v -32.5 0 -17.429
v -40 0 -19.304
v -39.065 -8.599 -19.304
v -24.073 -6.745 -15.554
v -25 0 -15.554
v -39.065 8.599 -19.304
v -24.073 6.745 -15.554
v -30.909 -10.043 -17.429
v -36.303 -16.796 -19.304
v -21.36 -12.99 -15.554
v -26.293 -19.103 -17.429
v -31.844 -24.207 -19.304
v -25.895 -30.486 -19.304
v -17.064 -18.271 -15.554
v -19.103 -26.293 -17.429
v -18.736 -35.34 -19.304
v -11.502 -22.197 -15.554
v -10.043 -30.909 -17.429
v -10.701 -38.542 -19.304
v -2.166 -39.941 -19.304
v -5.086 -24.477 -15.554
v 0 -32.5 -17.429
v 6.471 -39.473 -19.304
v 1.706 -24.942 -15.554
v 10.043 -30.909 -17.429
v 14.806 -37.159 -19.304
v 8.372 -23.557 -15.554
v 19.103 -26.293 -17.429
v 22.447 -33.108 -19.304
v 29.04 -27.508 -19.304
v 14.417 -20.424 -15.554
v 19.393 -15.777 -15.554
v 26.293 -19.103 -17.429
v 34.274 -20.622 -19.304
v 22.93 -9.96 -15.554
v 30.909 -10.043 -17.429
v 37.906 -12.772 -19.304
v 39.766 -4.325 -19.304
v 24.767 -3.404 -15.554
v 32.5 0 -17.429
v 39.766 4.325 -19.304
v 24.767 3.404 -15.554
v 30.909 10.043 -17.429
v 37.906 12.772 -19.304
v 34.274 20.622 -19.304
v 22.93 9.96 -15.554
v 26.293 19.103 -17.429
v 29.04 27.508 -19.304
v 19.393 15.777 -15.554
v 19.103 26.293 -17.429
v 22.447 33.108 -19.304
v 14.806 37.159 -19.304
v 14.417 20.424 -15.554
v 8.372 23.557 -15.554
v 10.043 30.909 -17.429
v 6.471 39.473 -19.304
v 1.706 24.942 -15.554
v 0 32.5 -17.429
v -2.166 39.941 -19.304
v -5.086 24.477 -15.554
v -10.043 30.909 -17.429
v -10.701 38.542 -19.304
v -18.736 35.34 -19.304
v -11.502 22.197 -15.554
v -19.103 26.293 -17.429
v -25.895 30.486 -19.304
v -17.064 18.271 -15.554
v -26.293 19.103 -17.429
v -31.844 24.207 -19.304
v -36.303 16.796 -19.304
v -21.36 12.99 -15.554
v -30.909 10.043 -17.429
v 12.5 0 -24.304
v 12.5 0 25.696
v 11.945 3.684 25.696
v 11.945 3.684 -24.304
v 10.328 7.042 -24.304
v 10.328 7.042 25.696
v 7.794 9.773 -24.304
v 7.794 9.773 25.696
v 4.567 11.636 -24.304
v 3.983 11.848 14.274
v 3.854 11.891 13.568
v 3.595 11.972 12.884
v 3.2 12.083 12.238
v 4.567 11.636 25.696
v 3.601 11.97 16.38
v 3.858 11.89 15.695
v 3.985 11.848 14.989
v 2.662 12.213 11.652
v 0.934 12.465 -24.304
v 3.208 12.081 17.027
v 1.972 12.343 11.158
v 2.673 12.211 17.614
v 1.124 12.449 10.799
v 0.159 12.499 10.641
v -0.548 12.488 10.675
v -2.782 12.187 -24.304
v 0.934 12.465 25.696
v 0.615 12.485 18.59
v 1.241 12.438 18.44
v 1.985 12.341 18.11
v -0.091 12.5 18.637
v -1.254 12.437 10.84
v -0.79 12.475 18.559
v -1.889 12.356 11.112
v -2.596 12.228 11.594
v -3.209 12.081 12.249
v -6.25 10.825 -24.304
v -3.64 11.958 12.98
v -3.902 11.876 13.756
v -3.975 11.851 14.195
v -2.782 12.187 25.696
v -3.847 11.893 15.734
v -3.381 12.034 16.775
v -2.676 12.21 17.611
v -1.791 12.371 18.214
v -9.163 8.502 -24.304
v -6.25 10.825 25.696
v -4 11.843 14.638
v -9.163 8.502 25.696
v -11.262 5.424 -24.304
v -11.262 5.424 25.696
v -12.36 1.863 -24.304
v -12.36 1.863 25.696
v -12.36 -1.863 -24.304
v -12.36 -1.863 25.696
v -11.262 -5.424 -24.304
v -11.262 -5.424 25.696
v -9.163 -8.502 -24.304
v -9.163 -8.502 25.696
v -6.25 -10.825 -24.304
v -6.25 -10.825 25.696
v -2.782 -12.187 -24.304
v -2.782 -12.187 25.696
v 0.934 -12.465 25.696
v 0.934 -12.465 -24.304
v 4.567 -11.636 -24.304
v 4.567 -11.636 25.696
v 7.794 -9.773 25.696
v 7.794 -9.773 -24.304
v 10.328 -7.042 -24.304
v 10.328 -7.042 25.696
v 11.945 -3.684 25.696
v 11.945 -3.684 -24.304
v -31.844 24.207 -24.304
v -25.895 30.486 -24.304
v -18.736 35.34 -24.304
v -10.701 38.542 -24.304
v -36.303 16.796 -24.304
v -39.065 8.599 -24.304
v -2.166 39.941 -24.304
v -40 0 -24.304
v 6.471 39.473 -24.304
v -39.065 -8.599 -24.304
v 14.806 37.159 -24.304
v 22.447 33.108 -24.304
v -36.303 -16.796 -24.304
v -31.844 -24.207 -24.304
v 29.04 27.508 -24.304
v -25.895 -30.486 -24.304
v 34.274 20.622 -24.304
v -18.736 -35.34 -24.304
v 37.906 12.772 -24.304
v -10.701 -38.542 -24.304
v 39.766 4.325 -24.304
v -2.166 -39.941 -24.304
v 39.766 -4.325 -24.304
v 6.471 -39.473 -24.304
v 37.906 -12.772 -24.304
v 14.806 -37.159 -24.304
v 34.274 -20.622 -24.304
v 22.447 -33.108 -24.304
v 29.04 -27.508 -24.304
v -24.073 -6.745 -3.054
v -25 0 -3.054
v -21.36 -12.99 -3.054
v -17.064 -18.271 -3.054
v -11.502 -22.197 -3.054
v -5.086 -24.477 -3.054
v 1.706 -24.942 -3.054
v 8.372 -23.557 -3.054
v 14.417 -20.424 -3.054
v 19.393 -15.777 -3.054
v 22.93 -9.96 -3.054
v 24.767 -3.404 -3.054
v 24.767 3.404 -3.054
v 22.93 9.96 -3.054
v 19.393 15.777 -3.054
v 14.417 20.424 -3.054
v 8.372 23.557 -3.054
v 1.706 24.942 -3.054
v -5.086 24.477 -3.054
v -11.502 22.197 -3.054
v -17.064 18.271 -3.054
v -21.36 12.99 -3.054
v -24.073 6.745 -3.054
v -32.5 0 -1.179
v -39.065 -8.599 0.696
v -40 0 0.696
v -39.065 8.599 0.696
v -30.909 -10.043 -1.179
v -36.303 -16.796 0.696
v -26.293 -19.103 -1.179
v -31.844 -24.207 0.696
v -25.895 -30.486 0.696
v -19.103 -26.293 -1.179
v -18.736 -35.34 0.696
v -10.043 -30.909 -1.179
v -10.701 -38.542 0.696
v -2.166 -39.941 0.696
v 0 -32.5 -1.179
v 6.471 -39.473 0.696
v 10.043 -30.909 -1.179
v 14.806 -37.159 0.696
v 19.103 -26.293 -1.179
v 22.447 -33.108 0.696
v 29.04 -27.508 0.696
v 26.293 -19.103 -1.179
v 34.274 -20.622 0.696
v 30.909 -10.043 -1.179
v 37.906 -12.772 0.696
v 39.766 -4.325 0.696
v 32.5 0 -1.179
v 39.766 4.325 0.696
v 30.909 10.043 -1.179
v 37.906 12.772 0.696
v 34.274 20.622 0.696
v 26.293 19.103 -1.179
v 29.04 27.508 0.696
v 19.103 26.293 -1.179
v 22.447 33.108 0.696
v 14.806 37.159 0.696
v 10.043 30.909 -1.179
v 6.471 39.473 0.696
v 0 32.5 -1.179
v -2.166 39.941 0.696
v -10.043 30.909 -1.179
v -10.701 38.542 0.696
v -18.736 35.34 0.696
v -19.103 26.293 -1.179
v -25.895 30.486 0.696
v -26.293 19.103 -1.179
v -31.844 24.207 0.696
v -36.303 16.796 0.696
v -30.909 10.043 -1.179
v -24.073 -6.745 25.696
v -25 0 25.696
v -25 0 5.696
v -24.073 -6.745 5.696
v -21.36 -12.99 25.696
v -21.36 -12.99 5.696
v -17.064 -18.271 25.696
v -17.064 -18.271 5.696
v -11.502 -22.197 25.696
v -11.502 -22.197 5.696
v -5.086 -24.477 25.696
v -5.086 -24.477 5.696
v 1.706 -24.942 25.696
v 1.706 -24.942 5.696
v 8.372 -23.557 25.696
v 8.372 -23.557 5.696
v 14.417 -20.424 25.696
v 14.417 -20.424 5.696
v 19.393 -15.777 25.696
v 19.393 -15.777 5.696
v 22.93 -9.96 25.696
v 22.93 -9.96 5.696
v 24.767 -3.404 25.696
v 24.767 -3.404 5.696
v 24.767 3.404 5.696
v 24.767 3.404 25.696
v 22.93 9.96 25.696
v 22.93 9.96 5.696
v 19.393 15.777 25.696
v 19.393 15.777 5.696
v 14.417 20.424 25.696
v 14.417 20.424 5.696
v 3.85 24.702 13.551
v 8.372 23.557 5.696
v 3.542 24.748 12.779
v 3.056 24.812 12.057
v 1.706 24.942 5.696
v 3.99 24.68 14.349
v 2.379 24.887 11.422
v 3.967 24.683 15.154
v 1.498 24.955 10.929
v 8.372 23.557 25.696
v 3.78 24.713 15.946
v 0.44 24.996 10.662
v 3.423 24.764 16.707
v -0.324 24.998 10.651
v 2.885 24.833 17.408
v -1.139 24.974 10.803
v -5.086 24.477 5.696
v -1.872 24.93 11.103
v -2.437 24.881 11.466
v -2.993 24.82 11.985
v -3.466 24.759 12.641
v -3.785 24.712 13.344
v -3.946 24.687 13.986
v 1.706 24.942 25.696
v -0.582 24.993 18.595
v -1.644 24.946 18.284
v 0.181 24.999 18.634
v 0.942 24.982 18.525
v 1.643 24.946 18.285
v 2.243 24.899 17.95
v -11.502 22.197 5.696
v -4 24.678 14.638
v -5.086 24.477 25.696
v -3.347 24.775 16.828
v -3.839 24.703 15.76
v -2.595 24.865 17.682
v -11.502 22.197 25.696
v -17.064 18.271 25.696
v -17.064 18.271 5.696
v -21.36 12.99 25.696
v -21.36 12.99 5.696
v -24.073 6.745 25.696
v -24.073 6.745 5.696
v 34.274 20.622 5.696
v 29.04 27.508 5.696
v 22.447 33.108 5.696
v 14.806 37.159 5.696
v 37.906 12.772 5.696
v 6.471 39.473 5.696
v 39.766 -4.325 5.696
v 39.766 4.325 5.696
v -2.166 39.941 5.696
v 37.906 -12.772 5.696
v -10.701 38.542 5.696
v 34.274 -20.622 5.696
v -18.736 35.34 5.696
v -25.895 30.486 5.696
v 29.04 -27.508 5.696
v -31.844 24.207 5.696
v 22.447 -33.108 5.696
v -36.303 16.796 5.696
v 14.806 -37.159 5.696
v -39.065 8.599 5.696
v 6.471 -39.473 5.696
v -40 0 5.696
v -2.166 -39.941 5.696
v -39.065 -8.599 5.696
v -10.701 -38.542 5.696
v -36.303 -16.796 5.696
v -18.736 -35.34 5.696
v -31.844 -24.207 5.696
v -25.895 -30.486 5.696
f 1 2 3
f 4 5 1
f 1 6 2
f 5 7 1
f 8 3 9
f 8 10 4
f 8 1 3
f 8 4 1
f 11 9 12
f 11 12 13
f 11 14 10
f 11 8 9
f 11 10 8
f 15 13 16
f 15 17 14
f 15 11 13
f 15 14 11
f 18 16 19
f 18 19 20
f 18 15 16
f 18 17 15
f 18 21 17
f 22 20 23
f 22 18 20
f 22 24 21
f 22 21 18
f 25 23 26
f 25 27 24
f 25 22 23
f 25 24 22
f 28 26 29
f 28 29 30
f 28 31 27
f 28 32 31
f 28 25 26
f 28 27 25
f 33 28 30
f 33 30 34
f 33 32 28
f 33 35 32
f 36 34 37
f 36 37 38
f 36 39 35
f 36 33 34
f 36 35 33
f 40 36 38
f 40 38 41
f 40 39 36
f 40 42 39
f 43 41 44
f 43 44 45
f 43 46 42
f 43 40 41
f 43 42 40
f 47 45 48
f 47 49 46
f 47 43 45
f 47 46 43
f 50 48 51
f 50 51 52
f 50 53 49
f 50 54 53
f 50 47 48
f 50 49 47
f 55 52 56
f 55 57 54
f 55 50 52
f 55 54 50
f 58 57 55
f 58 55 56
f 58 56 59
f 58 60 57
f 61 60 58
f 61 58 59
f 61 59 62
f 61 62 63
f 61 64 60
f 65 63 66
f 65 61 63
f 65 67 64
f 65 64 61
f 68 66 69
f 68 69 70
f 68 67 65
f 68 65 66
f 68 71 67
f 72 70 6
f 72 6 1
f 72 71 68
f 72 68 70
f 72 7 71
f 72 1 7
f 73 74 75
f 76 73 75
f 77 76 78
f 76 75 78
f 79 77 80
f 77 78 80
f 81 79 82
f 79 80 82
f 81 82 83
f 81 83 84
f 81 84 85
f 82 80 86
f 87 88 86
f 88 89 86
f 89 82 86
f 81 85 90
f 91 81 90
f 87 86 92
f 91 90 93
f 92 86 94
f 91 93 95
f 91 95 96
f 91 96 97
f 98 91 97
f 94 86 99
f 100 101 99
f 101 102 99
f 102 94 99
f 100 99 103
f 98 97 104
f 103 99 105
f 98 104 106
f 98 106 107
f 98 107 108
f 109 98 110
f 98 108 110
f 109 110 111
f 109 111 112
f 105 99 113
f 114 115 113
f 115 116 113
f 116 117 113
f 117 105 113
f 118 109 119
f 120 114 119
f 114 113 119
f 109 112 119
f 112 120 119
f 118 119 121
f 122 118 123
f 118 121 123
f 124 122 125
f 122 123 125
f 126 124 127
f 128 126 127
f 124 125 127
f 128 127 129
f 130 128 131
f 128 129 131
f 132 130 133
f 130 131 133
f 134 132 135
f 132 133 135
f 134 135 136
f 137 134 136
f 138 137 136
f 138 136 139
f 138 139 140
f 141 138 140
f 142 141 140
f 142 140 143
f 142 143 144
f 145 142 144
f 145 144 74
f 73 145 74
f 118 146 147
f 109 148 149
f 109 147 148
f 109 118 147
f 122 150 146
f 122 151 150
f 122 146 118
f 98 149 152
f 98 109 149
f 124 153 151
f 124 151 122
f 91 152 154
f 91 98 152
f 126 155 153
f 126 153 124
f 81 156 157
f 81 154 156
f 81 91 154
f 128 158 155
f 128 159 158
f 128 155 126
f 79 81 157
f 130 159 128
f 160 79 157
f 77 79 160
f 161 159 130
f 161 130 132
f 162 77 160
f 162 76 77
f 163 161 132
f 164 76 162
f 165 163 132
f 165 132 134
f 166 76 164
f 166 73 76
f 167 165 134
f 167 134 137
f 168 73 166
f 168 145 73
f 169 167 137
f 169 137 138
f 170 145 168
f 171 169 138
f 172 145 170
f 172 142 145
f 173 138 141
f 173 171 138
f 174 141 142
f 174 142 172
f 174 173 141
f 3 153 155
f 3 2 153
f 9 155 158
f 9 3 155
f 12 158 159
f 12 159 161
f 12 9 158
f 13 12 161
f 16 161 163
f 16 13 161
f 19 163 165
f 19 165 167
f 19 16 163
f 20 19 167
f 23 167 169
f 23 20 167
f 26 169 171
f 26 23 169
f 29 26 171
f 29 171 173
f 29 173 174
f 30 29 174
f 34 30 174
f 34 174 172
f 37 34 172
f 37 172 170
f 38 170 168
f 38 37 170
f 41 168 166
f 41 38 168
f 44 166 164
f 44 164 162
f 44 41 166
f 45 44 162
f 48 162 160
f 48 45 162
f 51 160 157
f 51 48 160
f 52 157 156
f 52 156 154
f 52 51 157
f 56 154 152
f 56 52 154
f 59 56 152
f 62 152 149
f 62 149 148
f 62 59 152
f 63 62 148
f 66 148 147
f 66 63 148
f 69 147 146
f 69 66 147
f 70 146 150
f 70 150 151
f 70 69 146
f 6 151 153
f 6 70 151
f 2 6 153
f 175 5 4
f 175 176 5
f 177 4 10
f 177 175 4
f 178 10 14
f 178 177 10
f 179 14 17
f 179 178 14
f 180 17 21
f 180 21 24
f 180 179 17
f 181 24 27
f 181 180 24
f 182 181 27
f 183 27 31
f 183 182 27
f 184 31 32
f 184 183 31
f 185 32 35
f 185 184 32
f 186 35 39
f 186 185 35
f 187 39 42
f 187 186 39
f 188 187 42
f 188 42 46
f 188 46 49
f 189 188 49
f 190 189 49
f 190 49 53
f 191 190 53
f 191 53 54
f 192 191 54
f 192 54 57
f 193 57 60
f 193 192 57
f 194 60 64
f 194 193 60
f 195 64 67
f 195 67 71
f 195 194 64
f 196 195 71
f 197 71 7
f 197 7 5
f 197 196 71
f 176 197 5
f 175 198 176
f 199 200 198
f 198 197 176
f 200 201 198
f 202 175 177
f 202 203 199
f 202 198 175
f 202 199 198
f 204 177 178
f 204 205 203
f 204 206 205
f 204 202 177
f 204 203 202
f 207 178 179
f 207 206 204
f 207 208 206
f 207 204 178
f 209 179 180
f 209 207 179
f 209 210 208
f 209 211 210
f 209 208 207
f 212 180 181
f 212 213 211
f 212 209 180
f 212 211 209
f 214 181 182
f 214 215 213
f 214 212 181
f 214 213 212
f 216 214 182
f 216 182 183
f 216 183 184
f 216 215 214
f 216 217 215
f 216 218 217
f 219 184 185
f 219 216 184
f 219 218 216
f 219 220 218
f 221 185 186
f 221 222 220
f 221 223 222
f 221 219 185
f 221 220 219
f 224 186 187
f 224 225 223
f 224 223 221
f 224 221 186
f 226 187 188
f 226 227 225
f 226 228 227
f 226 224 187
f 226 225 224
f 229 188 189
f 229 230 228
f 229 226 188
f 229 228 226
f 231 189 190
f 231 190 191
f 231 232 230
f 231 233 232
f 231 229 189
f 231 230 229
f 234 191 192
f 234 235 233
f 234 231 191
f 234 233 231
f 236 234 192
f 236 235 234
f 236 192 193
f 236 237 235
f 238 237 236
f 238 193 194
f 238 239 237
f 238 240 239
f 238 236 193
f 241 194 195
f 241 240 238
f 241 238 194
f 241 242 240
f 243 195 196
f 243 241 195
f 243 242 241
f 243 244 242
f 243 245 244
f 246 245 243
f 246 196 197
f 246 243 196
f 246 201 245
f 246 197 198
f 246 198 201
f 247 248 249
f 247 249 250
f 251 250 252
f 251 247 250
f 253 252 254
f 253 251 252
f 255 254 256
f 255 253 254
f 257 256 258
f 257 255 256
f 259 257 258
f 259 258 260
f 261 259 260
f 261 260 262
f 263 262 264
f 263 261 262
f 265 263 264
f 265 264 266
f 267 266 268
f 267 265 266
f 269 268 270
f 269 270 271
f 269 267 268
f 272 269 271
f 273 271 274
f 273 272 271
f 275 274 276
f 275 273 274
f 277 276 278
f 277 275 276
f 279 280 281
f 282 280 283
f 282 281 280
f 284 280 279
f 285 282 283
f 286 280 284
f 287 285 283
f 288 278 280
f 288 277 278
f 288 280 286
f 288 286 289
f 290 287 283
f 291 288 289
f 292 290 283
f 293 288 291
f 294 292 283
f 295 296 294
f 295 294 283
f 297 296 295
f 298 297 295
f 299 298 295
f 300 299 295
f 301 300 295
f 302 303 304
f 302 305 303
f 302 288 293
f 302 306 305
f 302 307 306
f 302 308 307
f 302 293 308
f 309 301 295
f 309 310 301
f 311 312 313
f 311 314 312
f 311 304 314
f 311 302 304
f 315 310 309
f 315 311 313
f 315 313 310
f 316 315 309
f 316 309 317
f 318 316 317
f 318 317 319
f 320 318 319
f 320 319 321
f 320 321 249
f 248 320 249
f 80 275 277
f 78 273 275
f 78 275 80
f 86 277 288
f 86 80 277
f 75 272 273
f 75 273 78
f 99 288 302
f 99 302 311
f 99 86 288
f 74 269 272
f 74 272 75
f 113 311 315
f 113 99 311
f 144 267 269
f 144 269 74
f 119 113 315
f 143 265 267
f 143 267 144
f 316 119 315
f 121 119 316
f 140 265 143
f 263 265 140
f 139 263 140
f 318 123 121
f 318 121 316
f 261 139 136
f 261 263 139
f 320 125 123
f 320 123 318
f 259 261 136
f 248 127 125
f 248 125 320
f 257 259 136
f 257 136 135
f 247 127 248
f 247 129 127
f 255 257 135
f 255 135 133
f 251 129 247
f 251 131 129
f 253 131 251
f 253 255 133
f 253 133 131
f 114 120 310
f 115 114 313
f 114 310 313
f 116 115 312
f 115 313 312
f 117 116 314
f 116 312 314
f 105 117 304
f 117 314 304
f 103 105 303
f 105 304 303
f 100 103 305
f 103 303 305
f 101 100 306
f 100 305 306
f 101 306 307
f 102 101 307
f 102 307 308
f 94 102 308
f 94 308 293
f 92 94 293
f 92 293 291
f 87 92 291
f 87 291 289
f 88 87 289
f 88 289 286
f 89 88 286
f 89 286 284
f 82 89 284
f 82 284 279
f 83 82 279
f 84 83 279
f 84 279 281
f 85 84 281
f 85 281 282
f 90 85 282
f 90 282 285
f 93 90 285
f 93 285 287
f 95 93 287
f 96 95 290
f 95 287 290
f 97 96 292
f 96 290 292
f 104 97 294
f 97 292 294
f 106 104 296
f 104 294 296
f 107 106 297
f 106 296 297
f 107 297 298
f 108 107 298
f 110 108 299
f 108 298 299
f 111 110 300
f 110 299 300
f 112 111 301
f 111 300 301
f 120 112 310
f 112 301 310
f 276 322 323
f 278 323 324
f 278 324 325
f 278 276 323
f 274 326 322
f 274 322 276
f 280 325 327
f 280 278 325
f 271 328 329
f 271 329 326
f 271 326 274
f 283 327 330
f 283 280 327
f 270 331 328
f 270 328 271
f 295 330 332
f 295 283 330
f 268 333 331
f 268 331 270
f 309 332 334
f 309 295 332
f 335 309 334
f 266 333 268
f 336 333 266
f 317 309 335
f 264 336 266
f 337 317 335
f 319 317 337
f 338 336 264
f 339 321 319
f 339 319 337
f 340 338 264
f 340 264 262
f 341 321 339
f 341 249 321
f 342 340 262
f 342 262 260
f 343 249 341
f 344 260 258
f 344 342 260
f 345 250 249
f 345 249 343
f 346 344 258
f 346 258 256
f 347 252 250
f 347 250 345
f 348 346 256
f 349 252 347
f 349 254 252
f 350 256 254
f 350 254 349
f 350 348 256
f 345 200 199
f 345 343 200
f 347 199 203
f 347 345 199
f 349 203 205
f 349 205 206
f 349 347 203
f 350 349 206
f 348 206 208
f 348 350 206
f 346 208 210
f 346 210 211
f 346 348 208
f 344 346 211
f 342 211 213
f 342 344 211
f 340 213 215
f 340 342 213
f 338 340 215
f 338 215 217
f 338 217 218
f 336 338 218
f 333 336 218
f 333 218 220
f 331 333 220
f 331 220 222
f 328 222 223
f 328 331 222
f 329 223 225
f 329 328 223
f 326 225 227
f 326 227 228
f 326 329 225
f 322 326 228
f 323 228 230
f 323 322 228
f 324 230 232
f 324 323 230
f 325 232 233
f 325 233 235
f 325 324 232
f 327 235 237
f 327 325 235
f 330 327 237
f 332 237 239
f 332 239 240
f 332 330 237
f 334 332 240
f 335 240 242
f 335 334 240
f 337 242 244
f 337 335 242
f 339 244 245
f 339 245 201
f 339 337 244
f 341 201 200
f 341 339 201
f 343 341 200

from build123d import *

# Parameters (mm, degrees)
SKETCH2_R          = 12.5
CUT_EXTRUDE1_DEPTH = 70
SKETCH5_R          = 4
CUT_EXTRUDE2_DEPTH = 27


with BuildPart() as part:
    # Sketch1 → Revolve1 (revolve)
    with BuildSketch(Plane(origin=(0, 0, 0), x_dir=(1, 0, 0), z_dir=(0, 1, 0)), mode=Mode.PRIVATE) as revolve1_sk:
        Polygon((0, 24.303944316), (40, 24.303944316), (40, 19.303944316), (25, 15.553944316), (25, 3.053944316), (40, -0.696055684), (40, -5.696055684), (25, -5.696055684), (25, -25.696055684), (0, -25.696055684), align=None)
    revolve(revolve1_sk.sketch.rotate(Axis((0, 0, -24.303944316), (0, 0, 1)), 180), axis=Axis((0, 0, -24.303944316), (0, 0, 1)))

    # Sketch2 → Cut-Extrude1 (cut)
    with BuildSketch(Plane.XY.offset(25.696055684)):
        Circle(SKETCH2_R)
    extrude(amount=-CUT_EXTRUDE1_DEPTH, mode=Mode.SUBTRACT)

    # Sketch5 → Cut-Extrude2 (cut)
    with BuildSketch(Plane(origin=(0, 25, 25.696055684), x_dir=(1, 0, 0), z_dir=(0, 1, 0))):
        with Locations(Location((0, 11.058273662, 0), (0, 0, 180))):
            Circle(SKETCH5_R)
    extrude(amount=-CUT_EXTRUDE2_DEPTH, mode=Mode.SUBTRACT)


solid = part.part
